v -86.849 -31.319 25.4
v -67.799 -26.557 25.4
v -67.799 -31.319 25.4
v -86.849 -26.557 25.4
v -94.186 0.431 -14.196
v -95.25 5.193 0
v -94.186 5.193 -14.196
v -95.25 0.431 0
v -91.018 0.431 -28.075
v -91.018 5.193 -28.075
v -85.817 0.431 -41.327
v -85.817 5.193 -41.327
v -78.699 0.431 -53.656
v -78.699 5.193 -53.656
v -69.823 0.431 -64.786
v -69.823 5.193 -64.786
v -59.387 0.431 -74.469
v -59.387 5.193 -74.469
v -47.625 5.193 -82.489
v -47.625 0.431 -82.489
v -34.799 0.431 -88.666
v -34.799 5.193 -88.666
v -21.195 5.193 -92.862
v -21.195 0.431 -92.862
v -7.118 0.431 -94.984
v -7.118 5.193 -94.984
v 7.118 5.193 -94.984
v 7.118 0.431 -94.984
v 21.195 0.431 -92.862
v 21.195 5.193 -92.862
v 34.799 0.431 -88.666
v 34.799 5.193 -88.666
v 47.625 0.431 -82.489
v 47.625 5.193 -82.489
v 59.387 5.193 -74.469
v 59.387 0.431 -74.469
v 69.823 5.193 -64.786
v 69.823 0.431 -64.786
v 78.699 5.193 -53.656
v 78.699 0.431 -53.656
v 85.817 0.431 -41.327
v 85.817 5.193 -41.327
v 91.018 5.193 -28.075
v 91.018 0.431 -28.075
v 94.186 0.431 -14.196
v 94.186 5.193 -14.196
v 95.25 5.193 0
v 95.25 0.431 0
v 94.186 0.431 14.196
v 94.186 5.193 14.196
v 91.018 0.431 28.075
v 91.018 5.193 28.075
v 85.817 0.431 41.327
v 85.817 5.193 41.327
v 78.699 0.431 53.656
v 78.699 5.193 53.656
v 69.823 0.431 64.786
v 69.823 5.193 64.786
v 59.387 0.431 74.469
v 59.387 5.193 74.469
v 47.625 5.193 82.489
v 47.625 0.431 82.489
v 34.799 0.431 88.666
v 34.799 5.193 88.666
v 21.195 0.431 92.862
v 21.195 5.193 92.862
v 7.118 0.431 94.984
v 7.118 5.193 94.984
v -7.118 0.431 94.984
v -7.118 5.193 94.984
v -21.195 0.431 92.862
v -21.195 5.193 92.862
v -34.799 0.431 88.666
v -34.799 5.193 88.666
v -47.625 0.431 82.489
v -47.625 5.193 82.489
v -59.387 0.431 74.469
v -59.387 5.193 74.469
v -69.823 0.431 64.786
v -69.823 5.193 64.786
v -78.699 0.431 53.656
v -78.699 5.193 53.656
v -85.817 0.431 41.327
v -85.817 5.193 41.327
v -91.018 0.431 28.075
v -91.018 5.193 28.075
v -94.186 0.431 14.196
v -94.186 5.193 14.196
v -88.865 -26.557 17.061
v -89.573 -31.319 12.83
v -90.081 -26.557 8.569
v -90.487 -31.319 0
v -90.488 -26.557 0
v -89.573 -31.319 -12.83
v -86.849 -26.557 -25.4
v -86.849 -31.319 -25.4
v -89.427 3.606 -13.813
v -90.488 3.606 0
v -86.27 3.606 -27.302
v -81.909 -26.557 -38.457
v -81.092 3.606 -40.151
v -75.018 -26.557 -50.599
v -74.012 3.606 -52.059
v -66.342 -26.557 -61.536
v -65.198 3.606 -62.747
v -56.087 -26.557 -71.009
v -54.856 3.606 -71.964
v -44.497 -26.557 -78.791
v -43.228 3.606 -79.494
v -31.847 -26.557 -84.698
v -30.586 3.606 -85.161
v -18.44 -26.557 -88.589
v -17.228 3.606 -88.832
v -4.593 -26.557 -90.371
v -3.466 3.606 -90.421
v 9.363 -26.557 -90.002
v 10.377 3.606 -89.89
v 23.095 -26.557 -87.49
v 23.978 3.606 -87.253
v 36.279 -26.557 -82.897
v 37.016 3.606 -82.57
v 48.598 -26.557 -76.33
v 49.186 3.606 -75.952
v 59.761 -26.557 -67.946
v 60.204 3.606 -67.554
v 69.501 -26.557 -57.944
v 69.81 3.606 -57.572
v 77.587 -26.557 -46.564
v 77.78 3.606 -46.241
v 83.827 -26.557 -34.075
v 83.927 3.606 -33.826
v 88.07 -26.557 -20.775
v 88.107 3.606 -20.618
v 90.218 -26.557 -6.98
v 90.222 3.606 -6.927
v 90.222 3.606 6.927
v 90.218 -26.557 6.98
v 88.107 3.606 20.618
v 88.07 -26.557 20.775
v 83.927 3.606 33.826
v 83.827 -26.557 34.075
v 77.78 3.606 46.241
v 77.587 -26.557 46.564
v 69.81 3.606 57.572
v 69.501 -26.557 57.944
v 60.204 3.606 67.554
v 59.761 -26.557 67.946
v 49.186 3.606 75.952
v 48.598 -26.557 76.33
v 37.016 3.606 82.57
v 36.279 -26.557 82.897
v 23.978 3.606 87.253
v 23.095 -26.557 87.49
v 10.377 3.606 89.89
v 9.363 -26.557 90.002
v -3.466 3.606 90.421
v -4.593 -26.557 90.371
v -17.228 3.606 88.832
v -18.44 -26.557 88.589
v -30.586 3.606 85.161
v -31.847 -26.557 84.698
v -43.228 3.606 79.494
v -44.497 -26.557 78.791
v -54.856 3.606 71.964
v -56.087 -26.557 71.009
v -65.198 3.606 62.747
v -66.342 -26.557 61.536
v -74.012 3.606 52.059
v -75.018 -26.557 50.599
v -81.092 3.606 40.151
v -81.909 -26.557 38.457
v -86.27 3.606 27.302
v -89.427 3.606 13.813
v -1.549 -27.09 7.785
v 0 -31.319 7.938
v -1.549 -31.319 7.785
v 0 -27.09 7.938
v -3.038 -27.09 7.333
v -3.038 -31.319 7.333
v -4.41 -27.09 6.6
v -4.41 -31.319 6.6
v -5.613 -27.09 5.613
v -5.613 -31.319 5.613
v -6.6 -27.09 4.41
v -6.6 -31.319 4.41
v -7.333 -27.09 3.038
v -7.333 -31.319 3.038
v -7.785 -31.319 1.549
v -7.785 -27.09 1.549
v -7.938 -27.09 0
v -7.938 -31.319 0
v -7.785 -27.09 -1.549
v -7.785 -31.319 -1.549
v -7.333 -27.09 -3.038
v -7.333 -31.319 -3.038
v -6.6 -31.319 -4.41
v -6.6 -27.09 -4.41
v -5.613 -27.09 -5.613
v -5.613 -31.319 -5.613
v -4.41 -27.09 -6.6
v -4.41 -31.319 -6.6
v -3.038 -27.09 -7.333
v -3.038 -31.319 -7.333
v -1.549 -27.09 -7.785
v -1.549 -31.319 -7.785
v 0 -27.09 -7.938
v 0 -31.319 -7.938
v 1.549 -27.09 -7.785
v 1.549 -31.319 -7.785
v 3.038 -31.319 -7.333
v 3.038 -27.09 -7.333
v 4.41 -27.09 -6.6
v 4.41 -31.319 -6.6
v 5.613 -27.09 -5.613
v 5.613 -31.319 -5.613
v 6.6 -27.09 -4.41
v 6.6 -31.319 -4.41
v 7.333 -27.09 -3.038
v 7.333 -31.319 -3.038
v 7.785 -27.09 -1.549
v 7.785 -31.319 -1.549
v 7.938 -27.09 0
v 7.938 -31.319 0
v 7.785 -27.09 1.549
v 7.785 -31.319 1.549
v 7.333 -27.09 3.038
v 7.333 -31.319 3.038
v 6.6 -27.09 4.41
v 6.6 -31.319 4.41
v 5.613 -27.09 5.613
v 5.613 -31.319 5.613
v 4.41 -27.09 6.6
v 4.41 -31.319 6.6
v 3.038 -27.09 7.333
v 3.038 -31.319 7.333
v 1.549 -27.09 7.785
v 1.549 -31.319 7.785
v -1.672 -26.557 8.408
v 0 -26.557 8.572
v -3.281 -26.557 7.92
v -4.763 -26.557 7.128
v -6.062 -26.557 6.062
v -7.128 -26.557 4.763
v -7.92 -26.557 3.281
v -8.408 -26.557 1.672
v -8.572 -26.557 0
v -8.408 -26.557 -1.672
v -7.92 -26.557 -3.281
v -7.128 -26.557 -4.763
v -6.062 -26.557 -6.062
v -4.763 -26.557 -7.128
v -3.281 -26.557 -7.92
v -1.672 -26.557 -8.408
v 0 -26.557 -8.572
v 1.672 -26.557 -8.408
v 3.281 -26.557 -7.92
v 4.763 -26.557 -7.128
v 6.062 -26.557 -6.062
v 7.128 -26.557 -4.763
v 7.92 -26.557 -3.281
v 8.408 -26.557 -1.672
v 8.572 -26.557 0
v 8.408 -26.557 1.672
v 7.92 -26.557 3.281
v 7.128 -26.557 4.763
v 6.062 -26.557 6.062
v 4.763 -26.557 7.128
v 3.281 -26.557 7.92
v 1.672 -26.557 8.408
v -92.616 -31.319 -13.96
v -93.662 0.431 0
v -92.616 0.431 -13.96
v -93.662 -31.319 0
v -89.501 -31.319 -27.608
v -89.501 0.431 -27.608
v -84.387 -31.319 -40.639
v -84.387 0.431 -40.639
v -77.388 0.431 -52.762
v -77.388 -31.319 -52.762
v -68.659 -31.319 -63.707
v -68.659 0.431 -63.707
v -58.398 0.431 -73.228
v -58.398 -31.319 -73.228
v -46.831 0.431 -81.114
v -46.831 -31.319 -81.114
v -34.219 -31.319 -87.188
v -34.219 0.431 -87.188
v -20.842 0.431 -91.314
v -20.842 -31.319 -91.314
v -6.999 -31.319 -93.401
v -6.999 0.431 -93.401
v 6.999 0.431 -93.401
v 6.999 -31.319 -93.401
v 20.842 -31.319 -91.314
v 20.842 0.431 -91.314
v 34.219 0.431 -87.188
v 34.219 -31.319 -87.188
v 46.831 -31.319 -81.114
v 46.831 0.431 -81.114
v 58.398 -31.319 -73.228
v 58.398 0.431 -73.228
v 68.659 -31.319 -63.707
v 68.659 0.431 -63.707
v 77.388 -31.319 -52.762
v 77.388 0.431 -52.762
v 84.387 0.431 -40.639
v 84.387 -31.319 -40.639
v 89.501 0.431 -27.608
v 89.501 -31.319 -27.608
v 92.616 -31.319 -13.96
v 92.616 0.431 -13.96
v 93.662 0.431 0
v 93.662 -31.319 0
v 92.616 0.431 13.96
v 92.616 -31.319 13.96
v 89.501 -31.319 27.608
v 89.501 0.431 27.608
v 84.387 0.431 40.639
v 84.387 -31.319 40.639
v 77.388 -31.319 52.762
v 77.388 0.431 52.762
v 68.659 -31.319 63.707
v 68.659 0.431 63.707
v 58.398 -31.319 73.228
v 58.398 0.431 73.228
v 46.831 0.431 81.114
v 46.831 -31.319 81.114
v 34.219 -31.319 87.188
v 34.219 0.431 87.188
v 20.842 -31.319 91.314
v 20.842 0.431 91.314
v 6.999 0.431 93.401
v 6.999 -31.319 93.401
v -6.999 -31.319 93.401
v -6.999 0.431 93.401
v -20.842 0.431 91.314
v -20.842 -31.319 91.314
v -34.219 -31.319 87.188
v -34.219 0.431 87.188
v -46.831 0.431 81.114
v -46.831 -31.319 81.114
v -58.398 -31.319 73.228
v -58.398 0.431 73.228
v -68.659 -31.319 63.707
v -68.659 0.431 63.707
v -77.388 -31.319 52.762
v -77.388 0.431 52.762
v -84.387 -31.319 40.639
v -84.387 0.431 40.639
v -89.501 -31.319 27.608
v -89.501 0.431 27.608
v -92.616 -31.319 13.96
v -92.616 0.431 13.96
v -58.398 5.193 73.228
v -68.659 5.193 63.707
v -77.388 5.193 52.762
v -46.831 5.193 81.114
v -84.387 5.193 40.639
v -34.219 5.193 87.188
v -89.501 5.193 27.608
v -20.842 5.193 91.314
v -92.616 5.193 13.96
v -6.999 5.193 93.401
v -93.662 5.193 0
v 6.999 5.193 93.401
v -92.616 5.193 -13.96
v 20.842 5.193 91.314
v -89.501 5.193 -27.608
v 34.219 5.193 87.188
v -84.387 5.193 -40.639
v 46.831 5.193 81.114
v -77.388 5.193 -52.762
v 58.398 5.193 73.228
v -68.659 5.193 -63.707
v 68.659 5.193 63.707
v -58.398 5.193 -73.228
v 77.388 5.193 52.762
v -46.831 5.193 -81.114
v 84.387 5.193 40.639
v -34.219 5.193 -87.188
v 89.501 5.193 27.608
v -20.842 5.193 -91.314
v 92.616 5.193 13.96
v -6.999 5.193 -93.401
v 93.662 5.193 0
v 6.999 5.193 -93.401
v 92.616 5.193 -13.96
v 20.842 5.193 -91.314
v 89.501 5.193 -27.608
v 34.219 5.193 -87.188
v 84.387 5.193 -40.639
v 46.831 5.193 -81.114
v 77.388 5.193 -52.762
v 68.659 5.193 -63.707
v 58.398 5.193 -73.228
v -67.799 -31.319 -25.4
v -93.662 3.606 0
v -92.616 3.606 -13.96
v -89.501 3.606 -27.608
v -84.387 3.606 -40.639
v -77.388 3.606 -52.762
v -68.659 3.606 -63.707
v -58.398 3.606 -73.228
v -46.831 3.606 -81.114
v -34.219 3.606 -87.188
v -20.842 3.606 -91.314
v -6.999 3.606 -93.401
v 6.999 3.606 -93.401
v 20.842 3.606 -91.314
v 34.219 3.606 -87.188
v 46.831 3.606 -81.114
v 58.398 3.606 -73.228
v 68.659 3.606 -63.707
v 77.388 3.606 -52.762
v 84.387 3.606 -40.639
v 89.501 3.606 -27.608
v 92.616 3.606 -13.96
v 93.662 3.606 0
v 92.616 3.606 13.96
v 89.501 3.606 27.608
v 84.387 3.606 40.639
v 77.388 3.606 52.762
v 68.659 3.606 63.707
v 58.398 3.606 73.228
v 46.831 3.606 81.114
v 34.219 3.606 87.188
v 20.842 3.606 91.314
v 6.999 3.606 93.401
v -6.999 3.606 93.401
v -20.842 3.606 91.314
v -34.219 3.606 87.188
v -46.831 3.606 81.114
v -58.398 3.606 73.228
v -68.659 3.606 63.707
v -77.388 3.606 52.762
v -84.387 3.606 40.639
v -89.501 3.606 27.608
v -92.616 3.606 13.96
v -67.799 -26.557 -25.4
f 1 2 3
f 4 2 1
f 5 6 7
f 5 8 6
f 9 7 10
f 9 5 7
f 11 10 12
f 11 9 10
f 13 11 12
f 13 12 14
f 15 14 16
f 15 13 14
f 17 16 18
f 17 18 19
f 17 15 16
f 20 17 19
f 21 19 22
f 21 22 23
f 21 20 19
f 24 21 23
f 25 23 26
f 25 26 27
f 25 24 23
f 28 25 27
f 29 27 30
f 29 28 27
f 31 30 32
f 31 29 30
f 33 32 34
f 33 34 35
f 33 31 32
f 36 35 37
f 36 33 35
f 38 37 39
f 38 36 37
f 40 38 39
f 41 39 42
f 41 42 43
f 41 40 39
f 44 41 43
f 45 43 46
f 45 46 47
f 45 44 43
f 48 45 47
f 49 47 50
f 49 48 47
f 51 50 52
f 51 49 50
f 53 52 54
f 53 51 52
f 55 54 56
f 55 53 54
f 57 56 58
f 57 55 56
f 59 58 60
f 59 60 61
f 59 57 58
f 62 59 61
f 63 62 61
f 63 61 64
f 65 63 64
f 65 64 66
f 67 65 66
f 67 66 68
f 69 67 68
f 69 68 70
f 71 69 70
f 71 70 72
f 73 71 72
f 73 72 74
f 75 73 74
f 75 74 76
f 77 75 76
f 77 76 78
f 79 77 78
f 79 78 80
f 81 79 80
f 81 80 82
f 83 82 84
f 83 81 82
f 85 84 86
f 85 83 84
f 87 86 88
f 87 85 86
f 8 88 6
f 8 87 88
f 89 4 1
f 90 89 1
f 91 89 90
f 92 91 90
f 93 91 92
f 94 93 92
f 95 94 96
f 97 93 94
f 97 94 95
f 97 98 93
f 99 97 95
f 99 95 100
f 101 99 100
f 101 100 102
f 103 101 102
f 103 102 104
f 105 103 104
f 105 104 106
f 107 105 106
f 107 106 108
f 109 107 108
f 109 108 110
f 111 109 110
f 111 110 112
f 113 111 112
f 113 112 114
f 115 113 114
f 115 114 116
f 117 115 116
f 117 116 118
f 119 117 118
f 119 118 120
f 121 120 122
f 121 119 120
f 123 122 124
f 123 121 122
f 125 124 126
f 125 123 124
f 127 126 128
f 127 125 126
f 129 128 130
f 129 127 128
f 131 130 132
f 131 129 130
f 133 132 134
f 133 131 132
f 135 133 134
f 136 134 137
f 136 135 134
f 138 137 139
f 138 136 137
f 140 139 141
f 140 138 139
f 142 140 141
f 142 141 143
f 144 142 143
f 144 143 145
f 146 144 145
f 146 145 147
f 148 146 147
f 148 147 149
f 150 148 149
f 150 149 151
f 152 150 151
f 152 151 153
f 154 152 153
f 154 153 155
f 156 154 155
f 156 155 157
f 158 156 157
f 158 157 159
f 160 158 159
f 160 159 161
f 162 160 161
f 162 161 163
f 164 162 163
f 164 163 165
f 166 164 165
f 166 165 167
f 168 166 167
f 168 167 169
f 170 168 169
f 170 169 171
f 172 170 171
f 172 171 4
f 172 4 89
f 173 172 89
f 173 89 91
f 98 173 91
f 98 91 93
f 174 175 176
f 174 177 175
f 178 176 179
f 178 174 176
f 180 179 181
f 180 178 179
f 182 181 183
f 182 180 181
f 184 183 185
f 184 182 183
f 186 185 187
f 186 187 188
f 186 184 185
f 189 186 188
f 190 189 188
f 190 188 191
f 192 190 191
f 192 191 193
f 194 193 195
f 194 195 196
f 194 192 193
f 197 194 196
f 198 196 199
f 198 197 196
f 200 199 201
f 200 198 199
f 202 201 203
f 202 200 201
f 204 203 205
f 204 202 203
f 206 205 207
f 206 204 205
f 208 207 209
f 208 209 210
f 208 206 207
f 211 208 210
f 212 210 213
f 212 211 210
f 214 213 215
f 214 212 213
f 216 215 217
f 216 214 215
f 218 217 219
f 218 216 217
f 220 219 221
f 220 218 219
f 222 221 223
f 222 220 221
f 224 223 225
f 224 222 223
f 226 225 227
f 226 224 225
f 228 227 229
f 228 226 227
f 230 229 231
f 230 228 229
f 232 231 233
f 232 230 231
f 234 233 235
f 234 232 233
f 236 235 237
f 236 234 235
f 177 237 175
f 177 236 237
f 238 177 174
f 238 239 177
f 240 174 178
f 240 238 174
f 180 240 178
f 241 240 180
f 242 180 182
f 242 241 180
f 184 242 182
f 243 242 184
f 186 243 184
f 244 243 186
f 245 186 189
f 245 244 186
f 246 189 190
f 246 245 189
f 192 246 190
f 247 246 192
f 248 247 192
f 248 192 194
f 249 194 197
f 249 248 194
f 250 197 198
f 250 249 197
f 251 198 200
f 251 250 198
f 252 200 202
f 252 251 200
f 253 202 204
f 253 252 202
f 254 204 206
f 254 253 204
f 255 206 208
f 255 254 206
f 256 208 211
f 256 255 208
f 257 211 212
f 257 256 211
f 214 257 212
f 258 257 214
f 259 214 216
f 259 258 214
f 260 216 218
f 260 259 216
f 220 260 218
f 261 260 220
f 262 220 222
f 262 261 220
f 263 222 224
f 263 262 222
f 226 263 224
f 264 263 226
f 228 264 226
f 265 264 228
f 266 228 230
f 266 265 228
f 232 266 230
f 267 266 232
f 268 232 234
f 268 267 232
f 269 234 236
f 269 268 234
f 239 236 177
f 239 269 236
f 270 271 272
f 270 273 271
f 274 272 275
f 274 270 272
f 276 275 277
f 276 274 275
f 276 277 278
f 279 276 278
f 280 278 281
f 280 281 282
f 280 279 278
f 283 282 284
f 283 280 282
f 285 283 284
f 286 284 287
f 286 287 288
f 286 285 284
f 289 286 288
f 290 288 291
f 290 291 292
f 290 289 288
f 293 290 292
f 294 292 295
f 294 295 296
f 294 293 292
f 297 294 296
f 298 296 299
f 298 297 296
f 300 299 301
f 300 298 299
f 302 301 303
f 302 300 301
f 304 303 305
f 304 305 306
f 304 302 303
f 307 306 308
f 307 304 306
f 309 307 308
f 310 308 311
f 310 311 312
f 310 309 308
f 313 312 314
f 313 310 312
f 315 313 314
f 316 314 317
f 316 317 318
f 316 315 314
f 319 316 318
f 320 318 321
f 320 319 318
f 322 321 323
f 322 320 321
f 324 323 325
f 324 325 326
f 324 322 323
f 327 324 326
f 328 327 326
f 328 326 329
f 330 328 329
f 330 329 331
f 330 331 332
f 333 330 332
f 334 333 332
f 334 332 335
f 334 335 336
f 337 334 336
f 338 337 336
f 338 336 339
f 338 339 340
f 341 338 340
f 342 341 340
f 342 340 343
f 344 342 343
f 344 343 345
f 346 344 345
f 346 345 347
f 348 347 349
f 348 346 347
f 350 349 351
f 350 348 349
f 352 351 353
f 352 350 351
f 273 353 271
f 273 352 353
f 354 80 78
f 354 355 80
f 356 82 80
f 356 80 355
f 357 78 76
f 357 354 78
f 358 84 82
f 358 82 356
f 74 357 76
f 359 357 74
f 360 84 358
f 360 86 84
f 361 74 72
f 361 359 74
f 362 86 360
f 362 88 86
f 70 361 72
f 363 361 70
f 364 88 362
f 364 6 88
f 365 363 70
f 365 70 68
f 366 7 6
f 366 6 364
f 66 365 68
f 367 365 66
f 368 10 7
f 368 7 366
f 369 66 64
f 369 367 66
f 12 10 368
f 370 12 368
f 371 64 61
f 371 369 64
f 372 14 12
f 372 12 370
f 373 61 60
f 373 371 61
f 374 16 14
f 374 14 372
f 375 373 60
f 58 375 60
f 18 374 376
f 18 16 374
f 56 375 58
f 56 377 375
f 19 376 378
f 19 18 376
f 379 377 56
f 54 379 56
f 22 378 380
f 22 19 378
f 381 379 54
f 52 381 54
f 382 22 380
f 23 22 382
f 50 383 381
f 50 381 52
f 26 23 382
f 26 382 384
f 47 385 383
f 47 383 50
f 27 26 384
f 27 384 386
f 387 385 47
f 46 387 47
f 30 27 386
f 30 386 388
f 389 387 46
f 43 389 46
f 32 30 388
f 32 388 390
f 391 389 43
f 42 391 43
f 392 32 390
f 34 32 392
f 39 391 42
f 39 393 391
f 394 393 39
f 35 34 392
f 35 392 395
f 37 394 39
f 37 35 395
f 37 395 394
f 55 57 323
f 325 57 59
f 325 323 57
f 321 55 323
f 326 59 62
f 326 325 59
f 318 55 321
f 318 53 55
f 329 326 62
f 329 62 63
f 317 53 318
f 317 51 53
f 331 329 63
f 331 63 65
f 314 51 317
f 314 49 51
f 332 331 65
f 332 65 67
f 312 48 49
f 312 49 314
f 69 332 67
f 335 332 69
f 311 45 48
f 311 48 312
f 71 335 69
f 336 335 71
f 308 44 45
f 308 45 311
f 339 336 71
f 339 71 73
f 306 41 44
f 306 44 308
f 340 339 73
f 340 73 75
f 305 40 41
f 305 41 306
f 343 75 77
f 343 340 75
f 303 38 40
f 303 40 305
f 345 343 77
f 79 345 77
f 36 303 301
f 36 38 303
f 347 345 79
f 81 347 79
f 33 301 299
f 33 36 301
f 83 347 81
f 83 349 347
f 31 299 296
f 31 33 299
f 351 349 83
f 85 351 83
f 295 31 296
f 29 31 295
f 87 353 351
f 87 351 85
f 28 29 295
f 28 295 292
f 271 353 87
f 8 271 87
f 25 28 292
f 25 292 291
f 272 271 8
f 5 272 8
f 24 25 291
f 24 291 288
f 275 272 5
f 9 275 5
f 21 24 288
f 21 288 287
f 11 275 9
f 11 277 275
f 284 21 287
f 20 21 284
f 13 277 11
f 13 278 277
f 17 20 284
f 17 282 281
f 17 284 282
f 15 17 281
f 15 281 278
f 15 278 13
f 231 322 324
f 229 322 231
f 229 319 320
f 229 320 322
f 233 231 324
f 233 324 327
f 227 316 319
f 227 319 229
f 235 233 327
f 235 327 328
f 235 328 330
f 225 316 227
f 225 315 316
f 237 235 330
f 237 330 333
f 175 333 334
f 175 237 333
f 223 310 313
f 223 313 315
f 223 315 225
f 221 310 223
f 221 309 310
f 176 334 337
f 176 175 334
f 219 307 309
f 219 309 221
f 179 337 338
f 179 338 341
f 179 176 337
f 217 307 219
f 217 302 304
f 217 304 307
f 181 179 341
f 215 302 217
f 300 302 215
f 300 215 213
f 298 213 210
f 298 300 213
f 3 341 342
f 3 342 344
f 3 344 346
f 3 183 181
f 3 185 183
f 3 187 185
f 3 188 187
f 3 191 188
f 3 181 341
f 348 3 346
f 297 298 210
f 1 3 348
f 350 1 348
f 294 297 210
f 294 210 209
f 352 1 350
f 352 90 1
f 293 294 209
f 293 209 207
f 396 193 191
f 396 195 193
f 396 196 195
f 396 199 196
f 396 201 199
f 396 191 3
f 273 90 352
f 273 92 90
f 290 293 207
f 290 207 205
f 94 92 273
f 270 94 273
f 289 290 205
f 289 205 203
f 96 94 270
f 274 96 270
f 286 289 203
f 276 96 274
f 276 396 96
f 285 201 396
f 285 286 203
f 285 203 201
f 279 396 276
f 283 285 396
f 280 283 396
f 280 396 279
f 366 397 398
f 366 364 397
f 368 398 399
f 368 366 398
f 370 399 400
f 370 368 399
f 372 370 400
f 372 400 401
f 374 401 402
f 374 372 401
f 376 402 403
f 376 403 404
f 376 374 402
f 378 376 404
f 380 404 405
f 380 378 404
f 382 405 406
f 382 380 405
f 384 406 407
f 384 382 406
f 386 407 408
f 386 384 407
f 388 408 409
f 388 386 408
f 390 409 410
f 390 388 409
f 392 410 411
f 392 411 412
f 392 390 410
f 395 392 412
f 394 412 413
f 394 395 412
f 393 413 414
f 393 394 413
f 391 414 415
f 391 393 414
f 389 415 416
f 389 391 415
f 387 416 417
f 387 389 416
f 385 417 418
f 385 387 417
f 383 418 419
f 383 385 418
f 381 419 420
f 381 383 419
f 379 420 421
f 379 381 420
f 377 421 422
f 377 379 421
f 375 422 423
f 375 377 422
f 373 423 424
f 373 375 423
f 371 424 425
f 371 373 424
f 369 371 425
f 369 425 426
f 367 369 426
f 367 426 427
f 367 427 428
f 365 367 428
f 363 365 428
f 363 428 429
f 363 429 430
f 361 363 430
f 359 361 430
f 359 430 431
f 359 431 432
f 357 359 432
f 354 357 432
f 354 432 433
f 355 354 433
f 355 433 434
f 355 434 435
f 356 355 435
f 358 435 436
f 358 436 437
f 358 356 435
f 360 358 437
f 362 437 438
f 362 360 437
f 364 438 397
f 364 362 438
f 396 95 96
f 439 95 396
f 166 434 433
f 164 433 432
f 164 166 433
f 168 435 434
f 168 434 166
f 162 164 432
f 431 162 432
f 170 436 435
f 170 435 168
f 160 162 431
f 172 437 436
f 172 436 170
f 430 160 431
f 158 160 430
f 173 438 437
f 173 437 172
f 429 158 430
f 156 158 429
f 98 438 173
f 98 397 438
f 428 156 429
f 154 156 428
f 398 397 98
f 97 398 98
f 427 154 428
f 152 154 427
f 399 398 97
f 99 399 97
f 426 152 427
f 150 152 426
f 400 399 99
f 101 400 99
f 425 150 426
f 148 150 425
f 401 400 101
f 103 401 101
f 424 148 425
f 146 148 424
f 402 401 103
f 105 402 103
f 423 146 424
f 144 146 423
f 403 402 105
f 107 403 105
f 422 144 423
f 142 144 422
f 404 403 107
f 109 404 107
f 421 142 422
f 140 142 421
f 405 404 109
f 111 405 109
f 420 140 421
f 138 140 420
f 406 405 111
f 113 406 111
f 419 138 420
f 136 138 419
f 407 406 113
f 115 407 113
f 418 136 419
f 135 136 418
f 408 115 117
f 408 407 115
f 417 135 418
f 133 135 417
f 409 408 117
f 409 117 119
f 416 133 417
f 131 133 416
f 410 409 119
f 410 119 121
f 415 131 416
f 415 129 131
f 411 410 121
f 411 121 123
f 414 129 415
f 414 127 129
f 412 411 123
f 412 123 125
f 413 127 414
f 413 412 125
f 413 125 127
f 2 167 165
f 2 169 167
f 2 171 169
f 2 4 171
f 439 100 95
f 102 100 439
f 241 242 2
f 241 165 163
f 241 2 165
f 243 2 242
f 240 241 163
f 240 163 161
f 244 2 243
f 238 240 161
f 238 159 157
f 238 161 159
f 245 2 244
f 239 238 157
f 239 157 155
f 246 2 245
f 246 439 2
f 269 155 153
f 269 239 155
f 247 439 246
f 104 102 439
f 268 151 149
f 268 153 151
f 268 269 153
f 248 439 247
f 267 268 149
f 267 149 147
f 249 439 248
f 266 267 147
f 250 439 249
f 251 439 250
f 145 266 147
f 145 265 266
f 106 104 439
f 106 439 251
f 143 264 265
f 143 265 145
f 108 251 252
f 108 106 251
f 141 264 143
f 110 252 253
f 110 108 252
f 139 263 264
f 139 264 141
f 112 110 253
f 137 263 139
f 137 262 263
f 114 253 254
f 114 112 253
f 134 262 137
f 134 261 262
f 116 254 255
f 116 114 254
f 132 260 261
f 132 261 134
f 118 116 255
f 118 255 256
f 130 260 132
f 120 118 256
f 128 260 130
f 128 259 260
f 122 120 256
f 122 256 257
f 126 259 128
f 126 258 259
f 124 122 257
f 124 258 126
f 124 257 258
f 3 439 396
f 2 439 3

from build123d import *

# Parameters (mm, degrees)
CUT_EXTRUDE1_DEPTH = 25.4


with BuildPart() as part:
    # Sketch1 → Revolve1 (revolve)
    with BuildSketch(Plane.XY):
        Polygon((-95.25, 5.193008475), (-95.25, 0.430508475), (-93.6625, 0.430508475), (-93.6625, -31.319491525), (0, -31.319491525), (0, -26.556991525), (-90.4875, -26.556991525), (-90.4875, 3.605508475), (-93.6625, 3.605508475), (-93.6625, 5.193008475), align=None)
    revolve(axis=Axis((0, 0, 0), (0, -1, 0)))

    # Sketch7 → 5/8 (0.625) Diameter Hole1 (revolve, cut)
    with BuildSketch(Plane(origin=(0, -26.556991525, 0), x_dir=(0, 0, 1), z_dir=(1, 0, 0))):
        Polygon((0, 0), (0, 4.7625), (7.9375, 4.7625), (7.9375, 0.532828266), (8.5725, 0), align=None)
    revolve(axis=Axis((0, -20.206991525, 0), (0, -1, 0)), mode=Mode.SUBTRACT)

    # Sketch12 → Cut-Extrude1 (cut)
    with BuildSketch(Plane(origin=(0, -26.556991525, 0), x_dir=(1, 0, 0), z_dir=(0, 1, 0))):
        with BuildLine():
            Line((-86.849453978, 25.4), (-67.799453978, 25.4))
            Line((-67.799453978, 25.4), (-67.799453978, -25.4))
            Line((-67.799453978, -25.4), (-86.849453978, -25.4))
            ThreePointArc((-86.849453978, -25.4), (-90.4875, 0), (-86.849453978, 25.4))
        make_face()
    extrude(amount=-CUT_EXTRUDE1_DEPTH, mode=Mode.SUBTRACT)


solid = part.part
